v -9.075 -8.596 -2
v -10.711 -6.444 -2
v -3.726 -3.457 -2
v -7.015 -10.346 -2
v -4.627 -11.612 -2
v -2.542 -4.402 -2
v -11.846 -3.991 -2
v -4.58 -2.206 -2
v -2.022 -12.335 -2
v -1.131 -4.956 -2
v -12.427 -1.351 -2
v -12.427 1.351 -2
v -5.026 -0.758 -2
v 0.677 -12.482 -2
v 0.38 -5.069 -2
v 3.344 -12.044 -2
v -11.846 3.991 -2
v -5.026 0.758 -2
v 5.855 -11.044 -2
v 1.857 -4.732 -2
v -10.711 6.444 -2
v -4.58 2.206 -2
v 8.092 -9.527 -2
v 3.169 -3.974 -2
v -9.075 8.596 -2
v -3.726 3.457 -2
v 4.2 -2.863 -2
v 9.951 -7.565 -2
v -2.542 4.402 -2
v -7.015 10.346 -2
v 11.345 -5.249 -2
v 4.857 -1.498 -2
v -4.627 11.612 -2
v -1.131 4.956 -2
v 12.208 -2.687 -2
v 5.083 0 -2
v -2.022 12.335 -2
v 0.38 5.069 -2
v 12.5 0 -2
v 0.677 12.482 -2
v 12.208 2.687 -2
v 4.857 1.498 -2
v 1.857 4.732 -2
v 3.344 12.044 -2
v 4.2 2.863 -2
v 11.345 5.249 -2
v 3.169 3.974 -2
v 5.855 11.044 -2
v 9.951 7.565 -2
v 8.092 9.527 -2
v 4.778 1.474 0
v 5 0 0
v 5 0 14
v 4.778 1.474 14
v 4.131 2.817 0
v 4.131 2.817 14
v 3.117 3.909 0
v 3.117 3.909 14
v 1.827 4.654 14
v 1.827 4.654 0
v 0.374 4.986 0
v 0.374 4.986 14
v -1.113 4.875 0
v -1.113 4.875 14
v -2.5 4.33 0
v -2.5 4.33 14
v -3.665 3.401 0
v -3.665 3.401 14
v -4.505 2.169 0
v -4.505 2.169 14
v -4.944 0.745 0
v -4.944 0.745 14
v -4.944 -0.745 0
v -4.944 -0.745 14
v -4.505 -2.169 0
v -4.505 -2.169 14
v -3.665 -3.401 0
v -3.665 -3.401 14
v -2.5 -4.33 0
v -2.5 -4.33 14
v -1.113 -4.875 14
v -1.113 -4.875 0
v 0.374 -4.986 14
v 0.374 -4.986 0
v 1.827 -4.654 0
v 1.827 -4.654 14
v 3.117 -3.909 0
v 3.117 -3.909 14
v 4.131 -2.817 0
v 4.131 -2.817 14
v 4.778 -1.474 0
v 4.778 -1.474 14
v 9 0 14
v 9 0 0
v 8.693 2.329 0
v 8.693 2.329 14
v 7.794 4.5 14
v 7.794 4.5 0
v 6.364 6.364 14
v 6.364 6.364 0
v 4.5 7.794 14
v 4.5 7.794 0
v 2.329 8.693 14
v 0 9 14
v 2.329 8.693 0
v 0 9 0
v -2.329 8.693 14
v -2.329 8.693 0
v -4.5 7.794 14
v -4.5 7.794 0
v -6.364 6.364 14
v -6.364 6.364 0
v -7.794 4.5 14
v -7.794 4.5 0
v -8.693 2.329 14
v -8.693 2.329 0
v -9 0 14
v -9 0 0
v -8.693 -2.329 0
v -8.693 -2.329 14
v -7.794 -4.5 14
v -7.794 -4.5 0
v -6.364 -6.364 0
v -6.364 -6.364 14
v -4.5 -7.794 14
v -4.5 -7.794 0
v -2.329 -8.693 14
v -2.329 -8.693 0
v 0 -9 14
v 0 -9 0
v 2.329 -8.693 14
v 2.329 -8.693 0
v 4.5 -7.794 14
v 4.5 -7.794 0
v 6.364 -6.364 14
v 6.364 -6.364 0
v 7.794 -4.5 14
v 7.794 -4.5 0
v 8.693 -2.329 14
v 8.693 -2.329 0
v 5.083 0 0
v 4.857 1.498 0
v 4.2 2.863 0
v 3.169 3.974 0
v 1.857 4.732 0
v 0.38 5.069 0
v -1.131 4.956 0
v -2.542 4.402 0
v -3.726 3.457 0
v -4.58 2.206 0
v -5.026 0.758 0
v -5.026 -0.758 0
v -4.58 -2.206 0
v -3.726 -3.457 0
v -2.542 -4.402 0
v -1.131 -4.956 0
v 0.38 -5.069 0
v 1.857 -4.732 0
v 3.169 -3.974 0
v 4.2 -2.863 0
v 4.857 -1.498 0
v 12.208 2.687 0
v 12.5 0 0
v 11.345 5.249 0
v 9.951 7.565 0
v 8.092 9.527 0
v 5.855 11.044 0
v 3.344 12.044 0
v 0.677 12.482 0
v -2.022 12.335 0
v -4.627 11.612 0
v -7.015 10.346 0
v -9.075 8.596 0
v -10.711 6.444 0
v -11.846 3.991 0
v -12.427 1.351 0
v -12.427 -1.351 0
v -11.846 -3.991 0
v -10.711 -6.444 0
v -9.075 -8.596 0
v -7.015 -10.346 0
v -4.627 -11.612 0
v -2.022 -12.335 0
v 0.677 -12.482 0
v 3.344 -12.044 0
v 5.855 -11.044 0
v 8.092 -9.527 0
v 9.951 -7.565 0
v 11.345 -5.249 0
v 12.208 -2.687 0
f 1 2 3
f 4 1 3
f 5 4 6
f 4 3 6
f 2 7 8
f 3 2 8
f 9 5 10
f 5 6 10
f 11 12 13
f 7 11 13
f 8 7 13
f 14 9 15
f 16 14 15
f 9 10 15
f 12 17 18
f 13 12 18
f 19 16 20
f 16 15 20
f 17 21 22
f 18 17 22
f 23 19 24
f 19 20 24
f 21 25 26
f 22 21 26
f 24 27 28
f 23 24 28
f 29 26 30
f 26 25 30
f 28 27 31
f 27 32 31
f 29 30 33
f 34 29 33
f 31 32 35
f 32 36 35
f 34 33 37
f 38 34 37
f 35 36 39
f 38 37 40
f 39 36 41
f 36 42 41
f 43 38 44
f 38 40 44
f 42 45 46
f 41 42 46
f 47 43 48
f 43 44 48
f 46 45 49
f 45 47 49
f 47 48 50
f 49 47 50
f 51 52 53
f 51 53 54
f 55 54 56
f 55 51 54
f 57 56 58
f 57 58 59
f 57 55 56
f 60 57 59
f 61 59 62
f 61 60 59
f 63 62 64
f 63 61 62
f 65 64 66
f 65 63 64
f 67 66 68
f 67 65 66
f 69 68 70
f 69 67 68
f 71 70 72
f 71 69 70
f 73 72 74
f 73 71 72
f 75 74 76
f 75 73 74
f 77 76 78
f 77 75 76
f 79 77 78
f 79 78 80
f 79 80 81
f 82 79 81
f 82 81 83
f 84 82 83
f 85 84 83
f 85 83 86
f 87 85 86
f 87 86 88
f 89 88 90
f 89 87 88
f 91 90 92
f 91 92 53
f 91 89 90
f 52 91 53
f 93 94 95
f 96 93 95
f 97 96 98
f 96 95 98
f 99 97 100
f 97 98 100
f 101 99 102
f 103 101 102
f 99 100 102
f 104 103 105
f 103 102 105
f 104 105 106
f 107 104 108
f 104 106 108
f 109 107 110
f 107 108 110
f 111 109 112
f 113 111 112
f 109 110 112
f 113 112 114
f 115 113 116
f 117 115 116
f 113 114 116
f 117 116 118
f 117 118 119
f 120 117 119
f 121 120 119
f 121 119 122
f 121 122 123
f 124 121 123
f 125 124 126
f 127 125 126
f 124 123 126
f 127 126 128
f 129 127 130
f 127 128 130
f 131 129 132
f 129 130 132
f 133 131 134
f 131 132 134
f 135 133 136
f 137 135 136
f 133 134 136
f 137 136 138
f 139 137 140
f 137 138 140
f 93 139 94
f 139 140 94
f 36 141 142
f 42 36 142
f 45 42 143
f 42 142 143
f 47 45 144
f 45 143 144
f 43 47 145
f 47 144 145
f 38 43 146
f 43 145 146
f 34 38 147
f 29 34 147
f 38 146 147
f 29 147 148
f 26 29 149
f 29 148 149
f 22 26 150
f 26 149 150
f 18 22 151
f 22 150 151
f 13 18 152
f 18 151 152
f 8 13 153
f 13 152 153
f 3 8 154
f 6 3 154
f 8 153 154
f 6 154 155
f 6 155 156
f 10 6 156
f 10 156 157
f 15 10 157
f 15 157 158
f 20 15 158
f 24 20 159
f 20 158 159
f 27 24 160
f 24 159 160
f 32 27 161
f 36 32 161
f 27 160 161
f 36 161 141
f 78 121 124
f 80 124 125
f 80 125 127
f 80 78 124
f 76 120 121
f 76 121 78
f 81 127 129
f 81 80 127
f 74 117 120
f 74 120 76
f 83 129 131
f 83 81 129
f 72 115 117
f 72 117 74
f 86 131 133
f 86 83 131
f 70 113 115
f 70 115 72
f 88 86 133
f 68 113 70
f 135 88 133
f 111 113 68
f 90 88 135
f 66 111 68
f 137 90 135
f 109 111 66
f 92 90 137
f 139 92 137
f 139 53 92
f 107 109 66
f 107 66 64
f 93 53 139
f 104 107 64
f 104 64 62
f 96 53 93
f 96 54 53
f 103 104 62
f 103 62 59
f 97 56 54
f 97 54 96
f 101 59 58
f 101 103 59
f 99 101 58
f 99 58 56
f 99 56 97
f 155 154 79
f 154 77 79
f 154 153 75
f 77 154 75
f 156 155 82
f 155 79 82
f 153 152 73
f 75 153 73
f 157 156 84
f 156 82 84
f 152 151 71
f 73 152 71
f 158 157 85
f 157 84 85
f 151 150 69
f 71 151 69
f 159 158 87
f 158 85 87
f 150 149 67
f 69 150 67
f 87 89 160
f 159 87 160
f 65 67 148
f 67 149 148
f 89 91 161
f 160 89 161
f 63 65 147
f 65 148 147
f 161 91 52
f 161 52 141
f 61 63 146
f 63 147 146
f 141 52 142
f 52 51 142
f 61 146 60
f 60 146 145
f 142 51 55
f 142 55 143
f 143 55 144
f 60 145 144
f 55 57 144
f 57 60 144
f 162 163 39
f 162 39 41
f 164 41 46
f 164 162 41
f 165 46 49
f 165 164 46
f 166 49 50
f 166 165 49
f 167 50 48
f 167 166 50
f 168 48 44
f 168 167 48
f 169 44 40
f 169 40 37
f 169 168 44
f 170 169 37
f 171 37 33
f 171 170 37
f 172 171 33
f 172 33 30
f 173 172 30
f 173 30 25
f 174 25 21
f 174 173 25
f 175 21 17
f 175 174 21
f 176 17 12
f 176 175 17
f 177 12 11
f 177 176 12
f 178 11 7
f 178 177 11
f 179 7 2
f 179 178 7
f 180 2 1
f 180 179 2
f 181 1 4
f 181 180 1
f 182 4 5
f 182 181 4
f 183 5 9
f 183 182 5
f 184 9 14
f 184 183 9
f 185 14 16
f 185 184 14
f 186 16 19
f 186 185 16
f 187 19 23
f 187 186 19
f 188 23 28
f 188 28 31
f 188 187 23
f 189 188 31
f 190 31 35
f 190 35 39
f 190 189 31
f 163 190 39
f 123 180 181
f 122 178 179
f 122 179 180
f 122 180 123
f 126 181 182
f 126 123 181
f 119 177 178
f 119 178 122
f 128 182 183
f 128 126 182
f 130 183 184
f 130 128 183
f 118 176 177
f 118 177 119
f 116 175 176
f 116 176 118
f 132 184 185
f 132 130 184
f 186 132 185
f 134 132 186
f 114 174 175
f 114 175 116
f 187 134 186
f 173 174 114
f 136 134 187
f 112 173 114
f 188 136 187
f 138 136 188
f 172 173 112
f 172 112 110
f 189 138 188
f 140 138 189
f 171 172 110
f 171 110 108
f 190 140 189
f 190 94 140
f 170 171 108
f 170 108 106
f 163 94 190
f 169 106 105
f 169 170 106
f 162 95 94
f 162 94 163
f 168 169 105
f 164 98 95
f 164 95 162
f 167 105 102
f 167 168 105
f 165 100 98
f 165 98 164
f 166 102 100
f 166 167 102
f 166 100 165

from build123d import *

# Parameters (mm, degrees)
F0_R     = 9
F0_R_2   = 5
F1_DEPTH = 14
F2_R     = 12.5
F2_R_2   = 5.083176
F3_DEPTH = 2


with BuildPart() as f1:
    # F0 (on Top) → F1 (new body)
    with BuildSketch(Plane.XY):
        Circle(F0_R)
        Circle(F0_R_2, mode=Mode.SUBTRACT)
    extrude(amount=F1_DEPTH)

    # F2 (on Top) → F3 (join)
    with BuildSketch(Plane.XY):
        Circle(F2_R)
        Circle(F2_R_2, mode=Mode.SUBTRACT)
    extrude(amount=-F3_DEPTH)


solid = f1.part
